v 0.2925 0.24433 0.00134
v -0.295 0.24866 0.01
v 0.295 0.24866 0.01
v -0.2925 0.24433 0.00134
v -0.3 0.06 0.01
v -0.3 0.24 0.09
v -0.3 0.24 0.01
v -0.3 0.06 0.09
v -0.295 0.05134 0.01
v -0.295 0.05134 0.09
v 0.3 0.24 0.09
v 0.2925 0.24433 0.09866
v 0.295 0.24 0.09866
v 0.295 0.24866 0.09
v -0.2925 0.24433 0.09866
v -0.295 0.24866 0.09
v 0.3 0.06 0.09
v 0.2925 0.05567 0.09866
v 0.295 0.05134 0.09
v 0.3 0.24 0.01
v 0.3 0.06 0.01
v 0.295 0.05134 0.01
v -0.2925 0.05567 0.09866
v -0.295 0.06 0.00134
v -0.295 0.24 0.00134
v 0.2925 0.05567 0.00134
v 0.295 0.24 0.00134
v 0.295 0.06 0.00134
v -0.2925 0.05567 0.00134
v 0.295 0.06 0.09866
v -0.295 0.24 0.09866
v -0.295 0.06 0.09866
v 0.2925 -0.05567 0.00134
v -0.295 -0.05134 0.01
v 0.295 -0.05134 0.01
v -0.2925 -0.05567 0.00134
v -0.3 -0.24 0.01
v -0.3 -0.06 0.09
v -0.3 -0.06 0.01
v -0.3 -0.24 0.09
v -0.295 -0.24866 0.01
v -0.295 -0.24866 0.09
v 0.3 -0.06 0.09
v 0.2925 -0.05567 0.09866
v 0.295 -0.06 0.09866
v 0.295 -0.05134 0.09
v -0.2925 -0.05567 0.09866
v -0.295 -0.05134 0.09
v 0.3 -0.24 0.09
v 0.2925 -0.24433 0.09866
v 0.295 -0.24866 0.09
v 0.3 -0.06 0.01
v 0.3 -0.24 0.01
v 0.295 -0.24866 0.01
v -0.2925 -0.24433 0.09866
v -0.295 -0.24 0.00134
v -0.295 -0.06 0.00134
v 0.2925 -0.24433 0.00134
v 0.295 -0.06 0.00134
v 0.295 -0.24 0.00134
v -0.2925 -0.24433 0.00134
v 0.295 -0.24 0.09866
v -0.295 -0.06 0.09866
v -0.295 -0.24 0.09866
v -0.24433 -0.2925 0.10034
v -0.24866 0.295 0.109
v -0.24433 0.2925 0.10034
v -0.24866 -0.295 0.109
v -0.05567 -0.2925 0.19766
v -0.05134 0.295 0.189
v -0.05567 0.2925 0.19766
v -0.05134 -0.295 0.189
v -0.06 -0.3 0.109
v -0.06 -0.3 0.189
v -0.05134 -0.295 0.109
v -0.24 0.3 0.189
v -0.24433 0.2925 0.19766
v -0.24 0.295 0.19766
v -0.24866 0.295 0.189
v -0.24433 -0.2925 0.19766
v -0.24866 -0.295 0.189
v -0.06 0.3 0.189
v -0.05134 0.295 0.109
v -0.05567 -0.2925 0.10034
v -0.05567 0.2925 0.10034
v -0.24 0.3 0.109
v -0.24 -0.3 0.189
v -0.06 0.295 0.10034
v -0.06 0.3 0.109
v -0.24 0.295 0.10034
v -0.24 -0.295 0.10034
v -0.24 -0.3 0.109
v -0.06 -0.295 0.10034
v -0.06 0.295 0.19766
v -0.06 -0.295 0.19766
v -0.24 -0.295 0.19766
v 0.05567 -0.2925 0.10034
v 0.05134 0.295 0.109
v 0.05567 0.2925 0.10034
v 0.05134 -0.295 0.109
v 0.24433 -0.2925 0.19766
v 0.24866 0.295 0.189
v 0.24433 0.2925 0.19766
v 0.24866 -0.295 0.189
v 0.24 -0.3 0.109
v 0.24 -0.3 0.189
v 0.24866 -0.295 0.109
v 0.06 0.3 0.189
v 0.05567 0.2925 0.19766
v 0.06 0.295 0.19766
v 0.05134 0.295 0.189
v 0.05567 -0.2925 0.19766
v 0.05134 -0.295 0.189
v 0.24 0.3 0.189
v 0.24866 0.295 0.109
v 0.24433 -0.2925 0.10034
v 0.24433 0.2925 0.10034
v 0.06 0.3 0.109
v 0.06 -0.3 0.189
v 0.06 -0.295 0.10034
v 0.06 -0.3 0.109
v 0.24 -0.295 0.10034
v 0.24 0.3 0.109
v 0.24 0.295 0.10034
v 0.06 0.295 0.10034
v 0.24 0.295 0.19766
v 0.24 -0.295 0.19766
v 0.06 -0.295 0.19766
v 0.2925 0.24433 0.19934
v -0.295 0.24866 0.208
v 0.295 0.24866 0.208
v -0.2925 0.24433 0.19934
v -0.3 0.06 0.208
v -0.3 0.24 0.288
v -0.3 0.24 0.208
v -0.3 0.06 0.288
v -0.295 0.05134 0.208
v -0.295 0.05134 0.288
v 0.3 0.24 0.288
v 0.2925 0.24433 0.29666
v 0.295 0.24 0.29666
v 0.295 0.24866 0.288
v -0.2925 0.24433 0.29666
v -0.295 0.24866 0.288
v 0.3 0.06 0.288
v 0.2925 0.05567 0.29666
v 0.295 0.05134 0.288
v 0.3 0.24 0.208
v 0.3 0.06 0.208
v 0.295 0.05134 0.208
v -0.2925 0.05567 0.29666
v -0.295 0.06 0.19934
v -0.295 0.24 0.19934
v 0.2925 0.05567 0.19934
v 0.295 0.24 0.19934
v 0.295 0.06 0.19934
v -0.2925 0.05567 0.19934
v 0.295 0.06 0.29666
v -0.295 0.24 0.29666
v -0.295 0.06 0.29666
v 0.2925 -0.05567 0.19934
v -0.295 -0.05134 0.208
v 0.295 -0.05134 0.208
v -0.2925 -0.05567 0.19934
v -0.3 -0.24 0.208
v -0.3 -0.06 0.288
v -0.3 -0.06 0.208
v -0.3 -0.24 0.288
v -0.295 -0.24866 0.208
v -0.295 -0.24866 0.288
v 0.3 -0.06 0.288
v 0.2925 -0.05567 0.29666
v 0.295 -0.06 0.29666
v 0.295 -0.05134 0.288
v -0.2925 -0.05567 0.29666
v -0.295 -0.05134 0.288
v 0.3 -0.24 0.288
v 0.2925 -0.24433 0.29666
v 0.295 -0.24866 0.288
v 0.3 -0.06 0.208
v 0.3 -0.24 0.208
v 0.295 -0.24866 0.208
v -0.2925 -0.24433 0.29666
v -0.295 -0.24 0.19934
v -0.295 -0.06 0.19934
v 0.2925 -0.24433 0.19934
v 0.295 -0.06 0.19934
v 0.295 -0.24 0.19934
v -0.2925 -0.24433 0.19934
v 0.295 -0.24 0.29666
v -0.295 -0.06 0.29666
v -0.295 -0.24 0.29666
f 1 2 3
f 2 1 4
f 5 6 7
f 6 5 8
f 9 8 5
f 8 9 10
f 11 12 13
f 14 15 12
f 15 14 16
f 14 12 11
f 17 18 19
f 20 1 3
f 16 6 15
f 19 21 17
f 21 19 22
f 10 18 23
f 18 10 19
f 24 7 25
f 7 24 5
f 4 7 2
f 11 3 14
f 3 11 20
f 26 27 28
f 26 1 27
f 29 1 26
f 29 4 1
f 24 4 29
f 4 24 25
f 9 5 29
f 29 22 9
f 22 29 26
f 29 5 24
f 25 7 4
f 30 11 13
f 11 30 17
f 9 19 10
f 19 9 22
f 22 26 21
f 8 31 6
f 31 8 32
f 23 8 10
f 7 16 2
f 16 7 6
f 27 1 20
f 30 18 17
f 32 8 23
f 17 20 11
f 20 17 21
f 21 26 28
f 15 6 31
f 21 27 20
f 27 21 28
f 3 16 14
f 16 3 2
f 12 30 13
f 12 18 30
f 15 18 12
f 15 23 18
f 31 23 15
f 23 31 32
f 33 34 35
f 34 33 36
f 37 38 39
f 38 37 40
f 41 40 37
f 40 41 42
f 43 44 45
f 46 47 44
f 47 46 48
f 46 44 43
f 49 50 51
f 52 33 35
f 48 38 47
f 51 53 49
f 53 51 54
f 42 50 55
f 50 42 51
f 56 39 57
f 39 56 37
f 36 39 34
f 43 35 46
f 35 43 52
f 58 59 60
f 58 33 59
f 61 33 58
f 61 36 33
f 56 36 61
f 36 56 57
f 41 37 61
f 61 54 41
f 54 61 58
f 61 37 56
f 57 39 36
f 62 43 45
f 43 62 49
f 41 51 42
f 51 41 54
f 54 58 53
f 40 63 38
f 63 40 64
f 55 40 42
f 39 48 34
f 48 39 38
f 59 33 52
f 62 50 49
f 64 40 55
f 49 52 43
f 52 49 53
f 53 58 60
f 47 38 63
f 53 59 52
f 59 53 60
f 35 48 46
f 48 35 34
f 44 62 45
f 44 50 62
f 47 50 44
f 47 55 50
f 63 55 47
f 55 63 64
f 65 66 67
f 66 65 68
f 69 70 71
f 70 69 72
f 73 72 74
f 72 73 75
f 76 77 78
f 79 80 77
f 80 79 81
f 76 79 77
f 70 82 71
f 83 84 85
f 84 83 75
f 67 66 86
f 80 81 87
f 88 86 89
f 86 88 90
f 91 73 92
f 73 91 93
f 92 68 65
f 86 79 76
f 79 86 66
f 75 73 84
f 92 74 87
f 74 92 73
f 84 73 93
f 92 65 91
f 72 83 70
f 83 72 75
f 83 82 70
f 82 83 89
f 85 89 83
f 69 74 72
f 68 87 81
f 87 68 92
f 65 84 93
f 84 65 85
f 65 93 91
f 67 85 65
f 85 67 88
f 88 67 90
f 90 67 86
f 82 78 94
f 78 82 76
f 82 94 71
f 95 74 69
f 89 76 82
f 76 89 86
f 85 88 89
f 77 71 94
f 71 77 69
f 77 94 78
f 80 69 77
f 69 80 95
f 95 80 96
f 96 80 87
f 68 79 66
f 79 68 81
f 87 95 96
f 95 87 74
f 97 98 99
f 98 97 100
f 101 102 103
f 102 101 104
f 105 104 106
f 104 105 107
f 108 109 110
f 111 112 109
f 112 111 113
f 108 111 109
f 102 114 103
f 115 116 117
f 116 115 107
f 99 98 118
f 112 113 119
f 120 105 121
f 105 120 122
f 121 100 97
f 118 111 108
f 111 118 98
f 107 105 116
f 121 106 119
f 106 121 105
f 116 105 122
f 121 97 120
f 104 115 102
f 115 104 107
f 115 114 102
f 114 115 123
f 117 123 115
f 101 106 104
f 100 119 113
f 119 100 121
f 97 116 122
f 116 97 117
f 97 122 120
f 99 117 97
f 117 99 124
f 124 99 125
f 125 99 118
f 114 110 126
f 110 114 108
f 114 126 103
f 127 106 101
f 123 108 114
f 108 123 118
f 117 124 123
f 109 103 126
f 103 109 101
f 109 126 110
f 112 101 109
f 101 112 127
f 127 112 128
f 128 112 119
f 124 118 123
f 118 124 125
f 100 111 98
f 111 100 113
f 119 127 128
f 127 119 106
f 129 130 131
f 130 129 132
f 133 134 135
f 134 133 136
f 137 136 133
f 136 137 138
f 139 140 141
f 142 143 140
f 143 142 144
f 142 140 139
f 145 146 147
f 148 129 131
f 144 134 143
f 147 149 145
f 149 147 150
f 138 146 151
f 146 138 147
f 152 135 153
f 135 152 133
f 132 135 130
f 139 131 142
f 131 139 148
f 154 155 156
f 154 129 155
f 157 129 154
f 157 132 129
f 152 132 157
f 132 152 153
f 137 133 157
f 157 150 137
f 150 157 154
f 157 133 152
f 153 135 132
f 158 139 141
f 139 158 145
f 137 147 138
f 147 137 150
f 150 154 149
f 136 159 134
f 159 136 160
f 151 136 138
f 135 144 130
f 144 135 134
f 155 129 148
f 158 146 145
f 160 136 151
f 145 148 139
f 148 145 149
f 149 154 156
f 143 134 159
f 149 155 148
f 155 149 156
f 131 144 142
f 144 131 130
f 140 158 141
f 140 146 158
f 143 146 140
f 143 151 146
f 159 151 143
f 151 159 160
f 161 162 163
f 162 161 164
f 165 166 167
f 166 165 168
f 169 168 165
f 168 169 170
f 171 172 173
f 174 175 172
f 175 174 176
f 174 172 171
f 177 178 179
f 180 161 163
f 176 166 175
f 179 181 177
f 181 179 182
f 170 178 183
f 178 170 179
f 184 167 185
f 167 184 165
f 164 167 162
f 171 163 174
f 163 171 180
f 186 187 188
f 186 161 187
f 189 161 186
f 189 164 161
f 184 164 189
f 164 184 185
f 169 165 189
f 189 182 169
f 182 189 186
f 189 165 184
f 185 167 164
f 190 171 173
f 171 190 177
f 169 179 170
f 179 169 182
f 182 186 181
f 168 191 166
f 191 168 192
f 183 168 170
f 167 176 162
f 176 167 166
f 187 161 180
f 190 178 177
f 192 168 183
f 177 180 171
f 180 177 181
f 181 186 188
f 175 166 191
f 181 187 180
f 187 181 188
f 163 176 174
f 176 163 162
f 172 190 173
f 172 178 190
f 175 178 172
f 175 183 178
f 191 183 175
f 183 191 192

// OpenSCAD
use <lib.scad>

module barLD() {
	box([0.6,0.2,0.1]);
}

module stackLD() {
	translate([0,0.15,0.05]) barLD();
	translate([0,-0.15,0.05]) barLD();
	rotate([0,0,90]) translate([0,0.15,0.149]) barLD();
	rotate([0,0,90]) translate([0,-0.15,0.149]) barLD();
	translate([0,0.15,0.248]) barLD();
	translate([0,-0.15,0.248]) barLD();
}

module barHD() {
	rbox([0.6,0.2,0.1],0.01,$fn=6);
}

module stackHD() {
	translate([0,0.15,0.05]) barHD();
	translate([0,-0.15,0.05]) barHD();
	rotate([0,0,90]) translate([0,0.15,0.149]) barHD();
	rotate([0,0,90]) translate([0,-0.15,0.149]) barHD();
	translate([0,0.15,0.248]) barHD();
	translate([0,-0.15,0.248]) barHD();
}

stackHD();
//stackLD();
